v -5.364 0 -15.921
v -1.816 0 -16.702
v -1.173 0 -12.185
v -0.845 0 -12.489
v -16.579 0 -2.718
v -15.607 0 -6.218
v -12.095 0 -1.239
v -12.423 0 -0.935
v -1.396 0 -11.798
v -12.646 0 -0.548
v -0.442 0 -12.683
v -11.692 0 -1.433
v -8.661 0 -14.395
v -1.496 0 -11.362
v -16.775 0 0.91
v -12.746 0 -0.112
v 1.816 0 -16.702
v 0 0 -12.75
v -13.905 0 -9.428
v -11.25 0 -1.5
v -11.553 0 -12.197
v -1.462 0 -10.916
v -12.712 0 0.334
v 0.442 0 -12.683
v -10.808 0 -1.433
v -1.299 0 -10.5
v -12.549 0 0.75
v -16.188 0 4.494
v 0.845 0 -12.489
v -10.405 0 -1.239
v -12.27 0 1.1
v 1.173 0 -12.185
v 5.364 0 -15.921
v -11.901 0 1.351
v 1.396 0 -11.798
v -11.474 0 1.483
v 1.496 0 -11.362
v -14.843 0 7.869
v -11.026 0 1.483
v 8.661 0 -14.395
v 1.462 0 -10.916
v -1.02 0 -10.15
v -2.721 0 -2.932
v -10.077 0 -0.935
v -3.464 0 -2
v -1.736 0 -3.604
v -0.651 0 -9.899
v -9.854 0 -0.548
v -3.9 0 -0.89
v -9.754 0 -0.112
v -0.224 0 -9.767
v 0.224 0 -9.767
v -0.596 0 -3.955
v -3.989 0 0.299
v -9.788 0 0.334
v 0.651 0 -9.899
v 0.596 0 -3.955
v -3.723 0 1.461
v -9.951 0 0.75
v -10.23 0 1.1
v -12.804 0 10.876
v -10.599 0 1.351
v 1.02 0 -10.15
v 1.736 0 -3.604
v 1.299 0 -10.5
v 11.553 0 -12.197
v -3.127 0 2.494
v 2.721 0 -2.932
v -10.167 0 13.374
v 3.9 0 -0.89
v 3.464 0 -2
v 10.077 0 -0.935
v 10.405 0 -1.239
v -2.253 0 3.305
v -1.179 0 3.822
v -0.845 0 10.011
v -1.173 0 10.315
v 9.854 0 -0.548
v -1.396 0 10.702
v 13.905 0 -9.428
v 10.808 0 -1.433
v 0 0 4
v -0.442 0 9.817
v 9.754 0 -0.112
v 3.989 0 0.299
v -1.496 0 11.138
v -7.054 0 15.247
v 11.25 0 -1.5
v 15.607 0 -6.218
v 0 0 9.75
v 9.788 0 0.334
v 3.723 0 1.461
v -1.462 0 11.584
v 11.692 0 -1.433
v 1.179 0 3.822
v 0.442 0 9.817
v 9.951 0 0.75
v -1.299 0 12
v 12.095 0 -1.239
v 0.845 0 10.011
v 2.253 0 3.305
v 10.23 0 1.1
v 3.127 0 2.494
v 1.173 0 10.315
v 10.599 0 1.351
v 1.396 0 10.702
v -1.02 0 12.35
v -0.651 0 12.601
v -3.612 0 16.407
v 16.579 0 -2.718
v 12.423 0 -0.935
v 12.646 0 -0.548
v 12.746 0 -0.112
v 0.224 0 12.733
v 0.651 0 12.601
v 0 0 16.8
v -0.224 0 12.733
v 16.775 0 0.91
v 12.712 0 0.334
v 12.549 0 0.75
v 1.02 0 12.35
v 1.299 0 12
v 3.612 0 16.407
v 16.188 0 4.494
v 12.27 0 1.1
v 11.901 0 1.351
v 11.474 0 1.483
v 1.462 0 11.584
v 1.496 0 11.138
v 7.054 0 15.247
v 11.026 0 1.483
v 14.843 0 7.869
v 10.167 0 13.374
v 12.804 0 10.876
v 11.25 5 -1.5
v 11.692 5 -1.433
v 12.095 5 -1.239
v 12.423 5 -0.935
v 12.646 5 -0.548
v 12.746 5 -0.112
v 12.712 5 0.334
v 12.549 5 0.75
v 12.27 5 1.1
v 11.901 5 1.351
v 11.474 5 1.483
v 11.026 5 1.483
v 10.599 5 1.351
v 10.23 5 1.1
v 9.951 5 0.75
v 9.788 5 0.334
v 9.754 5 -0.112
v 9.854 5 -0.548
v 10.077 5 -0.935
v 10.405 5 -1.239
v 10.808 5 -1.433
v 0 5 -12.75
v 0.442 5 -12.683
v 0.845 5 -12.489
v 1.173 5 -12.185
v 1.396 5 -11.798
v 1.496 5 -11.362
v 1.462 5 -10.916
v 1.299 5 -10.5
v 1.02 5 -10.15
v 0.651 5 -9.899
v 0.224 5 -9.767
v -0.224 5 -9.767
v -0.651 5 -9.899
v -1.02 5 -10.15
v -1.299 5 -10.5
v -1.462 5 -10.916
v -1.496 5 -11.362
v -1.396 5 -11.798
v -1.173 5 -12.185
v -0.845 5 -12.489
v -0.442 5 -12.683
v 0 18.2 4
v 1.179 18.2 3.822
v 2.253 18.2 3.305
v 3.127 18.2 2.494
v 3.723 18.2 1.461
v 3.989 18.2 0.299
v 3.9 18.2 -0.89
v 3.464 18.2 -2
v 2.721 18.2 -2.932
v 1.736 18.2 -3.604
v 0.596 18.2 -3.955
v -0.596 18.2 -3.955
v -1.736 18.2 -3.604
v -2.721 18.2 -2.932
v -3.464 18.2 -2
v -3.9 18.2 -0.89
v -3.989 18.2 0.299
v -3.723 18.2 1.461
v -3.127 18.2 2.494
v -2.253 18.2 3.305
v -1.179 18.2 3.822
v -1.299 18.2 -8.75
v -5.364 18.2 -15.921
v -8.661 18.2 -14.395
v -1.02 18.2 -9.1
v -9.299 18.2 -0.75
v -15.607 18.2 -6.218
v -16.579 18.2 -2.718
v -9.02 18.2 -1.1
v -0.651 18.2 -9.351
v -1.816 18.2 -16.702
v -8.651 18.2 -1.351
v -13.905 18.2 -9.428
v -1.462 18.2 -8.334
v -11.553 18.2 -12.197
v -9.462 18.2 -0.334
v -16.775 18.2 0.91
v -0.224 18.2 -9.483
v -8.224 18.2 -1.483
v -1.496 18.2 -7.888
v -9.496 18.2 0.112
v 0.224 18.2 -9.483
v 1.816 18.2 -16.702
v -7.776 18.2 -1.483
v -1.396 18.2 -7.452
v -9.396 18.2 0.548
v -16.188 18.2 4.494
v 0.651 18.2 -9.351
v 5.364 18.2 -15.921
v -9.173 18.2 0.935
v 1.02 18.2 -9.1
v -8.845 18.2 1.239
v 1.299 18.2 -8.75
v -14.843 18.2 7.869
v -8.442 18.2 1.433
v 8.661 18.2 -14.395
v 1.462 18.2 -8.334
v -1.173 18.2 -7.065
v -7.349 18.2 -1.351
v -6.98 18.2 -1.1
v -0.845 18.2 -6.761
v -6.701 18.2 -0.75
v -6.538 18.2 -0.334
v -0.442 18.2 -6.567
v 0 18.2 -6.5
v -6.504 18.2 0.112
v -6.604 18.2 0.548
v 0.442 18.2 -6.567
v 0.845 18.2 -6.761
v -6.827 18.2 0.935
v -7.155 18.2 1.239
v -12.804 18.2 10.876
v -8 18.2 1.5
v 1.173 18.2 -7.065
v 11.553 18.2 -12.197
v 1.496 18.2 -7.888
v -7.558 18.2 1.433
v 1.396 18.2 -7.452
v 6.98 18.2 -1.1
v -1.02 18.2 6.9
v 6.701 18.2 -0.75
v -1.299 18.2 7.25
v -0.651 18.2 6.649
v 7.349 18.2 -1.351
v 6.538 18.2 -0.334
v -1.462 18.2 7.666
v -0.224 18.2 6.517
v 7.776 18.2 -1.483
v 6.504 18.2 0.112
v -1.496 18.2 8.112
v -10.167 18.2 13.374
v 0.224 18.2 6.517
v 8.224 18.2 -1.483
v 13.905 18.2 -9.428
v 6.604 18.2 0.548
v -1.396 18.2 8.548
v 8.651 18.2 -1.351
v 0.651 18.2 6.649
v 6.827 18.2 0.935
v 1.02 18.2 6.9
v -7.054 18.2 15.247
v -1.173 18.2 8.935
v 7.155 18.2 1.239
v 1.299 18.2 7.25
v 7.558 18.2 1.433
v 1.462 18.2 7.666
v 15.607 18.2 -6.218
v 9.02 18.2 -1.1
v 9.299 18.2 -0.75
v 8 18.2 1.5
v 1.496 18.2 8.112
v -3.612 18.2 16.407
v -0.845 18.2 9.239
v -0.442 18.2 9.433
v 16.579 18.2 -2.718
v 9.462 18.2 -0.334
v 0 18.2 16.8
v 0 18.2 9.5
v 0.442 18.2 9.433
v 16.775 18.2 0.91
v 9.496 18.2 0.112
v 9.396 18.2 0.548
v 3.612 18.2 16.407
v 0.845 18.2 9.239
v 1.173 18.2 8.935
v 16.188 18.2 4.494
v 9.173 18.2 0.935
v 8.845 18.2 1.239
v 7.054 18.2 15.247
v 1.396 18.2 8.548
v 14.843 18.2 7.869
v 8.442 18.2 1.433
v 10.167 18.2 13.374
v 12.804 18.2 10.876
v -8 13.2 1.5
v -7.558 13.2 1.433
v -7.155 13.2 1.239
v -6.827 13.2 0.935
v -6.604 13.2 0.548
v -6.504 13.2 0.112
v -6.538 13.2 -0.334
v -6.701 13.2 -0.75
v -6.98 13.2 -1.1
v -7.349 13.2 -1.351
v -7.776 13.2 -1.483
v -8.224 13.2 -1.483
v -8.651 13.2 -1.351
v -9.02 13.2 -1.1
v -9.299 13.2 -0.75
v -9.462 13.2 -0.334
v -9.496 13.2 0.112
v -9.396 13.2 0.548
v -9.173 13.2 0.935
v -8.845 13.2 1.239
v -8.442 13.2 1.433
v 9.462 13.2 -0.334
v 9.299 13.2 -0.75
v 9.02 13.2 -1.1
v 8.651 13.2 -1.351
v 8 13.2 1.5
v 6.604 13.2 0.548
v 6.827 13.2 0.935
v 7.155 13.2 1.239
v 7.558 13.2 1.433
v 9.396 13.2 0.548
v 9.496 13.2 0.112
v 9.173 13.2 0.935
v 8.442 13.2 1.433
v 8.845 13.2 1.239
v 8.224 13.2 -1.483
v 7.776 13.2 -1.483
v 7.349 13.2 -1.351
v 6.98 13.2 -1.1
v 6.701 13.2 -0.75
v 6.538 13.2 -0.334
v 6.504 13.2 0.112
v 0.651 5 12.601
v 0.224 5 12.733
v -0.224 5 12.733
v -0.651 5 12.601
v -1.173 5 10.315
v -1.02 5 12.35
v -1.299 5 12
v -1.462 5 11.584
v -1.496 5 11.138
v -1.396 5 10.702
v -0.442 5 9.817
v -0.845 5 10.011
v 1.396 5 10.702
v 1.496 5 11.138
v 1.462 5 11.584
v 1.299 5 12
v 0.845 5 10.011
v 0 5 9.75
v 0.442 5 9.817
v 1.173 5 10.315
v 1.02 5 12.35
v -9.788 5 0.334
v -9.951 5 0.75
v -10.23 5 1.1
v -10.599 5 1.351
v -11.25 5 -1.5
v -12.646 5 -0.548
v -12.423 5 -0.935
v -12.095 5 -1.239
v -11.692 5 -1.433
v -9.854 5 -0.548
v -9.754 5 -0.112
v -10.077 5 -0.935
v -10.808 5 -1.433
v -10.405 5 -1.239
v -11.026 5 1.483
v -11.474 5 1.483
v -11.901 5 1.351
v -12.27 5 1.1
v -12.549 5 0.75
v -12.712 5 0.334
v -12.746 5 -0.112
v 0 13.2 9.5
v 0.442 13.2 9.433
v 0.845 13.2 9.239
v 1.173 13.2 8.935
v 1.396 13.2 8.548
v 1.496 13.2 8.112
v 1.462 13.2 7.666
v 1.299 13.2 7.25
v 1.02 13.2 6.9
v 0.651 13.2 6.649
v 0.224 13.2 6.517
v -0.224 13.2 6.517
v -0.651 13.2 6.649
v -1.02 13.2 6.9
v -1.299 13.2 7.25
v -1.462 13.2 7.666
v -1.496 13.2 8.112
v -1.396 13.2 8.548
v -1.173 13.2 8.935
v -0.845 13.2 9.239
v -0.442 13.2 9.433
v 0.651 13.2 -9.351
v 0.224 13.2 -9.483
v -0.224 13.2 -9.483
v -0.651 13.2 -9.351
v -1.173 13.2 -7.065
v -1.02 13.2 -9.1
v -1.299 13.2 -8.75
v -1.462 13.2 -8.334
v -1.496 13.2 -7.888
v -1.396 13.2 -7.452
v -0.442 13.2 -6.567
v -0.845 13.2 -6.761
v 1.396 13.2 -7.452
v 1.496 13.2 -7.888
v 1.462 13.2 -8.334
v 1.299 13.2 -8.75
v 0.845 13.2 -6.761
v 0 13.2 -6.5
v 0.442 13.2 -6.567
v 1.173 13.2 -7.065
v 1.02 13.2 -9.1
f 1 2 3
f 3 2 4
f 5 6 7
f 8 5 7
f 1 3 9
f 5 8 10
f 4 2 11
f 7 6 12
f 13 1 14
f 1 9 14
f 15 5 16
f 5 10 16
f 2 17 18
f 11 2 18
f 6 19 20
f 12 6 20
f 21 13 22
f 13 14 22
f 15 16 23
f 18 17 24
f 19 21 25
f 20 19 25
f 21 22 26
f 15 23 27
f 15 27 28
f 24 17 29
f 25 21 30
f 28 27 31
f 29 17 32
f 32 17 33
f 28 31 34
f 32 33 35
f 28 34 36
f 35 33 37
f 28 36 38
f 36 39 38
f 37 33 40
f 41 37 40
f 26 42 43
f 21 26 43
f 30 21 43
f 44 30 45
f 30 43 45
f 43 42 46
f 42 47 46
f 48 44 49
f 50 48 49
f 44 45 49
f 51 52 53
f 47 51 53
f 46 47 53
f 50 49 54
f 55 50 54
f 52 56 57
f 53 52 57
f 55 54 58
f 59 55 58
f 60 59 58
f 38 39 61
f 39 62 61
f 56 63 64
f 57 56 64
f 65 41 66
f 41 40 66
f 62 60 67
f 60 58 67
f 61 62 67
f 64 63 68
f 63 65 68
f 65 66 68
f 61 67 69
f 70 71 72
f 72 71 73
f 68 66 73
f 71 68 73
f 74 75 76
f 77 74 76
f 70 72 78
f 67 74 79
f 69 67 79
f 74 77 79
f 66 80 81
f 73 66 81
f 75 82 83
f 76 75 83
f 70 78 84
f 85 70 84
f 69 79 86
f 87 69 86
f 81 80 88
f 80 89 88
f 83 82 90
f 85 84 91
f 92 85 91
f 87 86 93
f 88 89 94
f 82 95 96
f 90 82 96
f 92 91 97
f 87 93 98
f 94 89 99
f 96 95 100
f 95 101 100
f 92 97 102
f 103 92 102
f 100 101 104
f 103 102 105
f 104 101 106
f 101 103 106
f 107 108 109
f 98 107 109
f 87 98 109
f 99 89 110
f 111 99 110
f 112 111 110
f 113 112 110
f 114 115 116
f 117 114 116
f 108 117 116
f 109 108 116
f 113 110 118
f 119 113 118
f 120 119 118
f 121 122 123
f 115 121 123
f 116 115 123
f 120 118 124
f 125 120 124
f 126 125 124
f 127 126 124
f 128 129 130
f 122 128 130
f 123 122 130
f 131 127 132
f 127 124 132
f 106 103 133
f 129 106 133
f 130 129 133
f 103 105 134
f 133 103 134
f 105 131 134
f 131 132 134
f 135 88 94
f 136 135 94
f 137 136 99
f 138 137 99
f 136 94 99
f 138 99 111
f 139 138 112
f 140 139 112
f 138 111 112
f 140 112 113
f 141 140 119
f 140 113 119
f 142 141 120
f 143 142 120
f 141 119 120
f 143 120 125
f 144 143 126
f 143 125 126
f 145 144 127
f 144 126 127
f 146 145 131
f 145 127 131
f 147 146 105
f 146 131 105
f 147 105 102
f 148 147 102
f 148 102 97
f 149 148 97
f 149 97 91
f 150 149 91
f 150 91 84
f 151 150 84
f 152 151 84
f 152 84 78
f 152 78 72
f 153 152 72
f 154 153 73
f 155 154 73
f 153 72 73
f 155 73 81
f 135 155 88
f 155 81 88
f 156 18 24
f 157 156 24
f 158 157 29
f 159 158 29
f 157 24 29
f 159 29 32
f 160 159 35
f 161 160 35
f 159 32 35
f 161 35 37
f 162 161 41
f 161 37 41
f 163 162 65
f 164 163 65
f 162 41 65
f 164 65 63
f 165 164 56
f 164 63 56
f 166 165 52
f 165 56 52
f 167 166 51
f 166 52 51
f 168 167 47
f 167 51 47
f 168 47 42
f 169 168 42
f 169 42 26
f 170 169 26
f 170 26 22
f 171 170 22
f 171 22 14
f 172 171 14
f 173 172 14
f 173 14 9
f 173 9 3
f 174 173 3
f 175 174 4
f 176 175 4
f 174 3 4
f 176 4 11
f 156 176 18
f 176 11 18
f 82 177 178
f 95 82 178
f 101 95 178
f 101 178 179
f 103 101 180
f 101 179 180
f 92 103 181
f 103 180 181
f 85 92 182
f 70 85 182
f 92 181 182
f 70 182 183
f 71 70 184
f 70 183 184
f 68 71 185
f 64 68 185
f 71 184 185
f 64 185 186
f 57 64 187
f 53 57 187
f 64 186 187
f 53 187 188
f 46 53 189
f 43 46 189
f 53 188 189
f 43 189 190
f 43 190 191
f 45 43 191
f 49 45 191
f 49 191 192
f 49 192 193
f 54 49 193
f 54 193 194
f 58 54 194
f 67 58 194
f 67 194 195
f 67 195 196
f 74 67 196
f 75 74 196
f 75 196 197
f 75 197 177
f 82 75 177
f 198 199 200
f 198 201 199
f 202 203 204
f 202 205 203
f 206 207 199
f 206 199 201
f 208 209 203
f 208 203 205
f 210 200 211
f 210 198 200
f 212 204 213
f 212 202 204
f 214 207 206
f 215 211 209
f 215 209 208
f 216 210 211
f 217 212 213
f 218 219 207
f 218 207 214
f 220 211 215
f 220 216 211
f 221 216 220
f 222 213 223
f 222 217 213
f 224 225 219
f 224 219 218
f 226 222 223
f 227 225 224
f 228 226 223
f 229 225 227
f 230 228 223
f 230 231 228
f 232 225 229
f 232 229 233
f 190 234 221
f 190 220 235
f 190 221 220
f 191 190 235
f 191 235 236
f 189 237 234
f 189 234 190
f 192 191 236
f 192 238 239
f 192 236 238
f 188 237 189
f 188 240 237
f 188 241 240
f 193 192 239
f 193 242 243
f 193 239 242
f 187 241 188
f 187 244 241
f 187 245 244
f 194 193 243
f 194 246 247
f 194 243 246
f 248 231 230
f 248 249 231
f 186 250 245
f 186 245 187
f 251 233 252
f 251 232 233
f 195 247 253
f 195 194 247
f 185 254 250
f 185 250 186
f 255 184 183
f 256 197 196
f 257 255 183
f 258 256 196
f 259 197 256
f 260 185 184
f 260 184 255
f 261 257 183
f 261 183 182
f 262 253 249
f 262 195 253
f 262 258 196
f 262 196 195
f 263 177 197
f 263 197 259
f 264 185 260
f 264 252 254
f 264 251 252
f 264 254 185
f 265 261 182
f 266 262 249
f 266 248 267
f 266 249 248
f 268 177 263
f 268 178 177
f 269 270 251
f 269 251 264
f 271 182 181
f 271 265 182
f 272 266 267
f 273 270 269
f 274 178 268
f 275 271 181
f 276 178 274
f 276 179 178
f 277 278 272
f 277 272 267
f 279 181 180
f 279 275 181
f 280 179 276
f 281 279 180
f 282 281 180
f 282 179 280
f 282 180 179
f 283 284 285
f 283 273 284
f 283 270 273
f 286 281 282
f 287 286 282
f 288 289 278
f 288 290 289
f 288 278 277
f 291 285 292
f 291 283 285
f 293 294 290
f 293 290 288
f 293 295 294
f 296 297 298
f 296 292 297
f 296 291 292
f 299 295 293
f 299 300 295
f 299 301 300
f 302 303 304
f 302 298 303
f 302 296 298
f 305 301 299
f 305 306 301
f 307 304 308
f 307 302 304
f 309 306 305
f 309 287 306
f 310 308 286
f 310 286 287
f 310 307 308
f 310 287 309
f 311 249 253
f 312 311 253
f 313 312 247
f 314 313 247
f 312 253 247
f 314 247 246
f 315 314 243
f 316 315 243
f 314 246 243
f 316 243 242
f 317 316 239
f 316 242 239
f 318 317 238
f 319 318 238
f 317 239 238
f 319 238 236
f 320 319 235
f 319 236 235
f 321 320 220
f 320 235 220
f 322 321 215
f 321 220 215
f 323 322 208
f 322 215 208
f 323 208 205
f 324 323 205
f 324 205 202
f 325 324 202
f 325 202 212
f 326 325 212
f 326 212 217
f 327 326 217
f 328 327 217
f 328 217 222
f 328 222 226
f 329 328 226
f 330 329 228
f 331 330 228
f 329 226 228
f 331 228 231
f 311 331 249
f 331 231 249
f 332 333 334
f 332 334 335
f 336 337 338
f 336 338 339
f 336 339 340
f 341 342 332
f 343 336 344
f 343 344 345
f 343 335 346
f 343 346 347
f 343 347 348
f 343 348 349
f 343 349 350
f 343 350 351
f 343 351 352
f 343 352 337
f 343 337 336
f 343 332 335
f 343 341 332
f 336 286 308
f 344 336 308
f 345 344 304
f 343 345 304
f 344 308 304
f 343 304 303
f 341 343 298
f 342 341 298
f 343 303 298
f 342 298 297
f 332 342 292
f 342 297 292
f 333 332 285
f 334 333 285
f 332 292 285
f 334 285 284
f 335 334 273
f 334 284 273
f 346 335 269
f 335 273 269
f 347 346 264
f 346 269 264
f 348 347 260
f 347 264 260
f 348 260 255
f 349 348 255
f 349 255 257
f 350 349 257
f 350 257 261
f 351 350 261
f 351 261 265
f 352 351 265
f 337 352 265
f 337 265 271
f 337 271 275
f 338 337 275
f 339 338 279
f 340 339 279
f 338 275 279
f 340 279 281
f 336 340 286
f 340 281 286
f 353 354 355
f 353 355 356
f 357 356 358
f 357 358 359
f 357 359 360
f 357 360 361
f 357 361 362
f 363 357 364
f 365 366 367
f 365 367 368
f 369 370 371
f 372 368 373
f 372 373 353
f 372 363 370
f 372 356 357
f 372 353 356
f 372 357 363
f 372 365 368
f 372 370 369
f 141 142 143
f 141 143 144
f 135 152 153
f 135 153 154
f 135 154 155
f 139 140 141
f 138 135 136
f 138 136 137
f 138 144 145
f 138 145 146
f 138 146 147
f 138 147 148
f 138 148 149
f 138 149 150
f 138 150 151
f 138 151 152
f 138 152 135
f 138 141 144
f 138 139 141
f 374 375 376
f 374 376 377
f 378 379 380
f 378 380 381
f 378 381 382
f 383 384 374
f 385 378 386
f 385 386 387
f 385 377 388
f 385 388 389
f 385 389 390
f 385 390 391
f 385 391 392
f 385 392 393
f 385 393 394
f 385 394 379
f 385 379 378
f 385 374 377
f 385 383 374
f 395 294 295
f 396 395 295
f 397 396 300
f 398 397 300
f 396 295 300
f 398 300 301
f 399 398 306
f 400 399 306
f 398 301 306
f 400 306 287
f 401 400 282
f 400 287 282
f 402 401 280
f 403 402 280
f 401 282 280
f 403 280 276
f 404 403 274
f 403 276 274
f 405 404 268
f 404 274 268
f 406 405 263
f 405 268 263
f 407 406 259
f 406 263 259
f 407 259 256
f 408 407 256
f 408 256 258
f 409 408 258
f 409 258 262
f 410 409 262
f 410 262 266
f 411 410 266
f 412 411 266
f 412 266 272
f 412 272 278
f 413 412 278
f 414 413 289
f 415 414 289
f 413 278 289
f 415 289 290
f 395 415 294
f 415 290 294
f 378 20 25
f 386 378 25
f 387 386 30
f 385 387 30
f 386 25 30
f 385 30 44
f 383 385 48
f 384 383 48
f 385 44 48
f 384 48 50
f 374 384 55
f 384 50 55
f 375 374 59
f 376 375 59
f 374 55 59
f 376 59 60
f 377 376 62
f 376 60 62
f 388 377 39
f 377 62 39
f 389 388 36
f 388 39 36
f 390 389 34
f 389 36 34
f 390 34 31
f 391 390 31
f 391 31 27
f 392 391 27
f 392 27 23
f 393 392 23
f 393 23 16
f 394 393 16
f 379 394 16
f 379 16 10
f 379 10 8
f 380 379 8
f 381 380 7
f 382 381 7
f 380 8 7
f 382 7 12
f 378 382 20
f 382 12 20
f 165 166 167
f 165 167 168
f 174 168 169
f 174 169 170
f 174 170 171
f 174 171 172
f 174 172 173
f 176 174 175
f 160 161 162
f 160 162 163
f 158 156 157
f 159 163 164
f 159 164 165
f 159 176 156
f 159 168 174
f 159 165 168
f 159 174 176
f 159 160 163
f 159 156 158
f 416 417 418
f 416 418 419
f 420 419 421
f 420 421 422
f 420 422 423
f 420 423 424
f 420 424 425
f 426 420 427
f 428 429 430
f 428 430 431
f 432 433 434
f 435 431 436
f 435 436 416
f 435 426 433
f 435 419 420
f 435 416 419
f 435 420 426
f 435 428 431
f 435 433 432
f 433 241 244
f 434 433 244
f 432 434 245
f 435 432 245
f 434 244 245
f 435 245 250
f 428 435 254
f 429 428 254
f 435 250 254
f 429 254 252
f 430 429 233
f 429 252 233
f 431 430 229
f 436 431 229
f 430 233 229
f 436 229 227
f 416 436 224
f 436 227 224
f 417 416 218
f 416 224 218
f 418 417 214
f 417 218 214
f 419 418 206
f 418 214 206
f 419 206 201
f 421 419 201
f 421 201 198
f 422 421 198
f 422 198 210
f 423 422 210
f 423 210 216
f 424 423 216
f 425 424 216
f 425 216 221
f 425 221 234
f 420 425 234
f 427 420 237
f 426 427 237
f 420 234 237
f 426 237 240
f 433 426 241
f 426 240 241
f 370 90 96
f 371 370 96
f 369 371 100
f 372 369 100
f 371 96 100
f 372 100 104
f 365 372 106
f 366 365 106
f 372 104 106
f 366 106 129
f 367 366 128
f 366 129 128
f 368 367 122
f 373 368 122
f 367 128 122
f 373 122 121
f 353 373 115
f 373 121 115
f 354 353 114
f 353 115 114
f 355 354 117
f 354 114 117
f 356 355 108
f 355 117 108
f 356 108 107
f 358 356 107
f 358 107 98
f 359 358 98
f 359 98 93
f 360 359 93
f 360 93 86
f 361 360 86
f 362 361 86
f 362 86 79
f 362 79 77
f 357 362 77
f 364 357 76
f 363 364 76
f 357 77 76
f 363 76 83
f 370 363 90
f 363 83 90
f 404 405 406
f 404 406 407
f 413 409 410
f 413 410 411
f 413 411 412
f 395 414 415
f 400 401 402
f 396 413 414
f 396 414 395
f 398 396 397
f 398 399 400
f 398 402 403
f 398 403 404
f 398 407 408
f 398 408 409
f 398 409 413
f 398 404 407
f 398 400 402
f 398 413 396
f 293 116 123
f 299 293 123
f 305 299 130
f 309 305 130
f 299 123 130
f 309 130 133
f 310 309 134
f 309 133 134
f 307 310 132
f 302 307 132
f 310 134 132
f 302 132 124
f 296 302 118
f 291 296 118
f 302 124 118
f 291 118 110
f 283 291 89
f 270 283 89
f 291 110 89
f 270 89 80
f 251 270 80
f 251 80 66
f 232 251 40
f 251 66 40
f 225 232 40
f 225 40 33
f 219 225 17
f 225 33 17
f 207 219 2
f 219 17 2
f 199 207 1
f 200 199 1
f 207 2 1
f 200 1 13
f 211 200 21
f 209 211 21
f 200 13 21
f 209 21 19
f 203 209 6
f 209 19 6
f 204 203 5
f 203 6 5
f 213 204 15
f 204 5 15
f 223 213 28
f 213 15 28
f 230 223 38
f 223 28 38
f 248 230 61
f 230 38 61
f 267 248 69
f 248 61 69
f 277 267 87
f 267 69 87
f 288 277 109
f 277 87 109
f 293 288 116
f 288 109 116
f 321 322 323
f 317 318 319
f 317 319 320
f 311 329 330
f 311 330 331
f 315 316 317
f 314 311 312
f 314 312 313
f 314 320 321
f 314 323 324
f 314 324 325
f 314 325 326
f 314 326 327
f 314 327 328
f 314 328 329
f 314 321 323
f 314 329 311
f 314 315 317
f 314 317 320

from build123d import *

# Parameters (mm, degrees)
SKETCH1_R           = 16.8
BOSS_EXTRUDE1_DEPTH = 18.2
SKETCH2_R           = 4
CUT_EXTRUDE1_DEPTH  = 30.928581657
SKETCH3_R           = 1.5
CUT_EXTRUDE2_DEPTH  = 5
SKETCH4_R           = 1.5
CUT_EXTRUDE3_DEPTH  = 5


with BuildPart() as part:
    # Sketch1 → Boss-Extrude1 (new body)
    with BuildSketch(Plane(origin=(0, 0, 0), x_dir=(1, 0, 0), z_dir=(0, 1, 0))):
        with Locations(Location((0, 0, 0), (0, 0, 270))):
            Circle(SKETCH1_R)
    extrude(amount=BOSS_EXTRUDE1_DEPTH)

    # Sketch2 → Cut-Extrude1 (cut, through all)
    with BuildSketch(Plane(origin=(0, 18.2, 0), x_dir=(1, 0, 0), z_dir=(0, 1, 0))):
        with Locations(Location((0, 0, 0), (0, 0, 270))):
            Circle(SKETCH2_R)
    extrude(amount=-CUT_EXTRUDE1_DEPTH, mode=Mode.SUBTRACT)

    # Sketch3 → Cut-Extrude2 (cut)
    with BuildSketch(Plane(origin=(0, 18.2, 0), x_dir=(1, 0, 0), z_dir=(0, 1, 0))):
        with Locations(Location((0, 8, 0), (0, 0, 270))):
            Circle(SKETCH3_R)
        with Locations(Location((8, 0, 0), (0, 0, 270))):
            Circle(SKETCH3_R)
        with Locations(Location((0, -8, 0), (0, 0, 270))):
            Circle(SKETCH3_R)
        with Locations(Location((-8, 0, 0), (0, 0, 270))):
            Circle(SKETCH3_R)
    extrude(amount=-CUT_EXTRUDE2_DEPTH, mode=Mode.SUBTRACT)

    # Sketch4 → Cut-Extrude3 (cut)
    with BuildSketch(Plane.XZ):
        with Locations(Location((0, 11.25, 0), (0, 0, 270))):
            Circle(SKETCH4_R)
        with Locations(Location((11.25, 0, 0), (0, 0, 270))):
            Circle(SKETCH4_R)
        with Locations(Location((0, -11.25, 0), (0, 0, 270))):
            Circle(SKETCH4_R)
        with Locations(Location((-11.25, 0, 0), (0, 0, 270))):
            Circle(SKETCH4_R)
    extrude(amount=-CUT_EXTRUDE3_DEPTH, mode=Mode.SUBTRACT)


solid = part.part
